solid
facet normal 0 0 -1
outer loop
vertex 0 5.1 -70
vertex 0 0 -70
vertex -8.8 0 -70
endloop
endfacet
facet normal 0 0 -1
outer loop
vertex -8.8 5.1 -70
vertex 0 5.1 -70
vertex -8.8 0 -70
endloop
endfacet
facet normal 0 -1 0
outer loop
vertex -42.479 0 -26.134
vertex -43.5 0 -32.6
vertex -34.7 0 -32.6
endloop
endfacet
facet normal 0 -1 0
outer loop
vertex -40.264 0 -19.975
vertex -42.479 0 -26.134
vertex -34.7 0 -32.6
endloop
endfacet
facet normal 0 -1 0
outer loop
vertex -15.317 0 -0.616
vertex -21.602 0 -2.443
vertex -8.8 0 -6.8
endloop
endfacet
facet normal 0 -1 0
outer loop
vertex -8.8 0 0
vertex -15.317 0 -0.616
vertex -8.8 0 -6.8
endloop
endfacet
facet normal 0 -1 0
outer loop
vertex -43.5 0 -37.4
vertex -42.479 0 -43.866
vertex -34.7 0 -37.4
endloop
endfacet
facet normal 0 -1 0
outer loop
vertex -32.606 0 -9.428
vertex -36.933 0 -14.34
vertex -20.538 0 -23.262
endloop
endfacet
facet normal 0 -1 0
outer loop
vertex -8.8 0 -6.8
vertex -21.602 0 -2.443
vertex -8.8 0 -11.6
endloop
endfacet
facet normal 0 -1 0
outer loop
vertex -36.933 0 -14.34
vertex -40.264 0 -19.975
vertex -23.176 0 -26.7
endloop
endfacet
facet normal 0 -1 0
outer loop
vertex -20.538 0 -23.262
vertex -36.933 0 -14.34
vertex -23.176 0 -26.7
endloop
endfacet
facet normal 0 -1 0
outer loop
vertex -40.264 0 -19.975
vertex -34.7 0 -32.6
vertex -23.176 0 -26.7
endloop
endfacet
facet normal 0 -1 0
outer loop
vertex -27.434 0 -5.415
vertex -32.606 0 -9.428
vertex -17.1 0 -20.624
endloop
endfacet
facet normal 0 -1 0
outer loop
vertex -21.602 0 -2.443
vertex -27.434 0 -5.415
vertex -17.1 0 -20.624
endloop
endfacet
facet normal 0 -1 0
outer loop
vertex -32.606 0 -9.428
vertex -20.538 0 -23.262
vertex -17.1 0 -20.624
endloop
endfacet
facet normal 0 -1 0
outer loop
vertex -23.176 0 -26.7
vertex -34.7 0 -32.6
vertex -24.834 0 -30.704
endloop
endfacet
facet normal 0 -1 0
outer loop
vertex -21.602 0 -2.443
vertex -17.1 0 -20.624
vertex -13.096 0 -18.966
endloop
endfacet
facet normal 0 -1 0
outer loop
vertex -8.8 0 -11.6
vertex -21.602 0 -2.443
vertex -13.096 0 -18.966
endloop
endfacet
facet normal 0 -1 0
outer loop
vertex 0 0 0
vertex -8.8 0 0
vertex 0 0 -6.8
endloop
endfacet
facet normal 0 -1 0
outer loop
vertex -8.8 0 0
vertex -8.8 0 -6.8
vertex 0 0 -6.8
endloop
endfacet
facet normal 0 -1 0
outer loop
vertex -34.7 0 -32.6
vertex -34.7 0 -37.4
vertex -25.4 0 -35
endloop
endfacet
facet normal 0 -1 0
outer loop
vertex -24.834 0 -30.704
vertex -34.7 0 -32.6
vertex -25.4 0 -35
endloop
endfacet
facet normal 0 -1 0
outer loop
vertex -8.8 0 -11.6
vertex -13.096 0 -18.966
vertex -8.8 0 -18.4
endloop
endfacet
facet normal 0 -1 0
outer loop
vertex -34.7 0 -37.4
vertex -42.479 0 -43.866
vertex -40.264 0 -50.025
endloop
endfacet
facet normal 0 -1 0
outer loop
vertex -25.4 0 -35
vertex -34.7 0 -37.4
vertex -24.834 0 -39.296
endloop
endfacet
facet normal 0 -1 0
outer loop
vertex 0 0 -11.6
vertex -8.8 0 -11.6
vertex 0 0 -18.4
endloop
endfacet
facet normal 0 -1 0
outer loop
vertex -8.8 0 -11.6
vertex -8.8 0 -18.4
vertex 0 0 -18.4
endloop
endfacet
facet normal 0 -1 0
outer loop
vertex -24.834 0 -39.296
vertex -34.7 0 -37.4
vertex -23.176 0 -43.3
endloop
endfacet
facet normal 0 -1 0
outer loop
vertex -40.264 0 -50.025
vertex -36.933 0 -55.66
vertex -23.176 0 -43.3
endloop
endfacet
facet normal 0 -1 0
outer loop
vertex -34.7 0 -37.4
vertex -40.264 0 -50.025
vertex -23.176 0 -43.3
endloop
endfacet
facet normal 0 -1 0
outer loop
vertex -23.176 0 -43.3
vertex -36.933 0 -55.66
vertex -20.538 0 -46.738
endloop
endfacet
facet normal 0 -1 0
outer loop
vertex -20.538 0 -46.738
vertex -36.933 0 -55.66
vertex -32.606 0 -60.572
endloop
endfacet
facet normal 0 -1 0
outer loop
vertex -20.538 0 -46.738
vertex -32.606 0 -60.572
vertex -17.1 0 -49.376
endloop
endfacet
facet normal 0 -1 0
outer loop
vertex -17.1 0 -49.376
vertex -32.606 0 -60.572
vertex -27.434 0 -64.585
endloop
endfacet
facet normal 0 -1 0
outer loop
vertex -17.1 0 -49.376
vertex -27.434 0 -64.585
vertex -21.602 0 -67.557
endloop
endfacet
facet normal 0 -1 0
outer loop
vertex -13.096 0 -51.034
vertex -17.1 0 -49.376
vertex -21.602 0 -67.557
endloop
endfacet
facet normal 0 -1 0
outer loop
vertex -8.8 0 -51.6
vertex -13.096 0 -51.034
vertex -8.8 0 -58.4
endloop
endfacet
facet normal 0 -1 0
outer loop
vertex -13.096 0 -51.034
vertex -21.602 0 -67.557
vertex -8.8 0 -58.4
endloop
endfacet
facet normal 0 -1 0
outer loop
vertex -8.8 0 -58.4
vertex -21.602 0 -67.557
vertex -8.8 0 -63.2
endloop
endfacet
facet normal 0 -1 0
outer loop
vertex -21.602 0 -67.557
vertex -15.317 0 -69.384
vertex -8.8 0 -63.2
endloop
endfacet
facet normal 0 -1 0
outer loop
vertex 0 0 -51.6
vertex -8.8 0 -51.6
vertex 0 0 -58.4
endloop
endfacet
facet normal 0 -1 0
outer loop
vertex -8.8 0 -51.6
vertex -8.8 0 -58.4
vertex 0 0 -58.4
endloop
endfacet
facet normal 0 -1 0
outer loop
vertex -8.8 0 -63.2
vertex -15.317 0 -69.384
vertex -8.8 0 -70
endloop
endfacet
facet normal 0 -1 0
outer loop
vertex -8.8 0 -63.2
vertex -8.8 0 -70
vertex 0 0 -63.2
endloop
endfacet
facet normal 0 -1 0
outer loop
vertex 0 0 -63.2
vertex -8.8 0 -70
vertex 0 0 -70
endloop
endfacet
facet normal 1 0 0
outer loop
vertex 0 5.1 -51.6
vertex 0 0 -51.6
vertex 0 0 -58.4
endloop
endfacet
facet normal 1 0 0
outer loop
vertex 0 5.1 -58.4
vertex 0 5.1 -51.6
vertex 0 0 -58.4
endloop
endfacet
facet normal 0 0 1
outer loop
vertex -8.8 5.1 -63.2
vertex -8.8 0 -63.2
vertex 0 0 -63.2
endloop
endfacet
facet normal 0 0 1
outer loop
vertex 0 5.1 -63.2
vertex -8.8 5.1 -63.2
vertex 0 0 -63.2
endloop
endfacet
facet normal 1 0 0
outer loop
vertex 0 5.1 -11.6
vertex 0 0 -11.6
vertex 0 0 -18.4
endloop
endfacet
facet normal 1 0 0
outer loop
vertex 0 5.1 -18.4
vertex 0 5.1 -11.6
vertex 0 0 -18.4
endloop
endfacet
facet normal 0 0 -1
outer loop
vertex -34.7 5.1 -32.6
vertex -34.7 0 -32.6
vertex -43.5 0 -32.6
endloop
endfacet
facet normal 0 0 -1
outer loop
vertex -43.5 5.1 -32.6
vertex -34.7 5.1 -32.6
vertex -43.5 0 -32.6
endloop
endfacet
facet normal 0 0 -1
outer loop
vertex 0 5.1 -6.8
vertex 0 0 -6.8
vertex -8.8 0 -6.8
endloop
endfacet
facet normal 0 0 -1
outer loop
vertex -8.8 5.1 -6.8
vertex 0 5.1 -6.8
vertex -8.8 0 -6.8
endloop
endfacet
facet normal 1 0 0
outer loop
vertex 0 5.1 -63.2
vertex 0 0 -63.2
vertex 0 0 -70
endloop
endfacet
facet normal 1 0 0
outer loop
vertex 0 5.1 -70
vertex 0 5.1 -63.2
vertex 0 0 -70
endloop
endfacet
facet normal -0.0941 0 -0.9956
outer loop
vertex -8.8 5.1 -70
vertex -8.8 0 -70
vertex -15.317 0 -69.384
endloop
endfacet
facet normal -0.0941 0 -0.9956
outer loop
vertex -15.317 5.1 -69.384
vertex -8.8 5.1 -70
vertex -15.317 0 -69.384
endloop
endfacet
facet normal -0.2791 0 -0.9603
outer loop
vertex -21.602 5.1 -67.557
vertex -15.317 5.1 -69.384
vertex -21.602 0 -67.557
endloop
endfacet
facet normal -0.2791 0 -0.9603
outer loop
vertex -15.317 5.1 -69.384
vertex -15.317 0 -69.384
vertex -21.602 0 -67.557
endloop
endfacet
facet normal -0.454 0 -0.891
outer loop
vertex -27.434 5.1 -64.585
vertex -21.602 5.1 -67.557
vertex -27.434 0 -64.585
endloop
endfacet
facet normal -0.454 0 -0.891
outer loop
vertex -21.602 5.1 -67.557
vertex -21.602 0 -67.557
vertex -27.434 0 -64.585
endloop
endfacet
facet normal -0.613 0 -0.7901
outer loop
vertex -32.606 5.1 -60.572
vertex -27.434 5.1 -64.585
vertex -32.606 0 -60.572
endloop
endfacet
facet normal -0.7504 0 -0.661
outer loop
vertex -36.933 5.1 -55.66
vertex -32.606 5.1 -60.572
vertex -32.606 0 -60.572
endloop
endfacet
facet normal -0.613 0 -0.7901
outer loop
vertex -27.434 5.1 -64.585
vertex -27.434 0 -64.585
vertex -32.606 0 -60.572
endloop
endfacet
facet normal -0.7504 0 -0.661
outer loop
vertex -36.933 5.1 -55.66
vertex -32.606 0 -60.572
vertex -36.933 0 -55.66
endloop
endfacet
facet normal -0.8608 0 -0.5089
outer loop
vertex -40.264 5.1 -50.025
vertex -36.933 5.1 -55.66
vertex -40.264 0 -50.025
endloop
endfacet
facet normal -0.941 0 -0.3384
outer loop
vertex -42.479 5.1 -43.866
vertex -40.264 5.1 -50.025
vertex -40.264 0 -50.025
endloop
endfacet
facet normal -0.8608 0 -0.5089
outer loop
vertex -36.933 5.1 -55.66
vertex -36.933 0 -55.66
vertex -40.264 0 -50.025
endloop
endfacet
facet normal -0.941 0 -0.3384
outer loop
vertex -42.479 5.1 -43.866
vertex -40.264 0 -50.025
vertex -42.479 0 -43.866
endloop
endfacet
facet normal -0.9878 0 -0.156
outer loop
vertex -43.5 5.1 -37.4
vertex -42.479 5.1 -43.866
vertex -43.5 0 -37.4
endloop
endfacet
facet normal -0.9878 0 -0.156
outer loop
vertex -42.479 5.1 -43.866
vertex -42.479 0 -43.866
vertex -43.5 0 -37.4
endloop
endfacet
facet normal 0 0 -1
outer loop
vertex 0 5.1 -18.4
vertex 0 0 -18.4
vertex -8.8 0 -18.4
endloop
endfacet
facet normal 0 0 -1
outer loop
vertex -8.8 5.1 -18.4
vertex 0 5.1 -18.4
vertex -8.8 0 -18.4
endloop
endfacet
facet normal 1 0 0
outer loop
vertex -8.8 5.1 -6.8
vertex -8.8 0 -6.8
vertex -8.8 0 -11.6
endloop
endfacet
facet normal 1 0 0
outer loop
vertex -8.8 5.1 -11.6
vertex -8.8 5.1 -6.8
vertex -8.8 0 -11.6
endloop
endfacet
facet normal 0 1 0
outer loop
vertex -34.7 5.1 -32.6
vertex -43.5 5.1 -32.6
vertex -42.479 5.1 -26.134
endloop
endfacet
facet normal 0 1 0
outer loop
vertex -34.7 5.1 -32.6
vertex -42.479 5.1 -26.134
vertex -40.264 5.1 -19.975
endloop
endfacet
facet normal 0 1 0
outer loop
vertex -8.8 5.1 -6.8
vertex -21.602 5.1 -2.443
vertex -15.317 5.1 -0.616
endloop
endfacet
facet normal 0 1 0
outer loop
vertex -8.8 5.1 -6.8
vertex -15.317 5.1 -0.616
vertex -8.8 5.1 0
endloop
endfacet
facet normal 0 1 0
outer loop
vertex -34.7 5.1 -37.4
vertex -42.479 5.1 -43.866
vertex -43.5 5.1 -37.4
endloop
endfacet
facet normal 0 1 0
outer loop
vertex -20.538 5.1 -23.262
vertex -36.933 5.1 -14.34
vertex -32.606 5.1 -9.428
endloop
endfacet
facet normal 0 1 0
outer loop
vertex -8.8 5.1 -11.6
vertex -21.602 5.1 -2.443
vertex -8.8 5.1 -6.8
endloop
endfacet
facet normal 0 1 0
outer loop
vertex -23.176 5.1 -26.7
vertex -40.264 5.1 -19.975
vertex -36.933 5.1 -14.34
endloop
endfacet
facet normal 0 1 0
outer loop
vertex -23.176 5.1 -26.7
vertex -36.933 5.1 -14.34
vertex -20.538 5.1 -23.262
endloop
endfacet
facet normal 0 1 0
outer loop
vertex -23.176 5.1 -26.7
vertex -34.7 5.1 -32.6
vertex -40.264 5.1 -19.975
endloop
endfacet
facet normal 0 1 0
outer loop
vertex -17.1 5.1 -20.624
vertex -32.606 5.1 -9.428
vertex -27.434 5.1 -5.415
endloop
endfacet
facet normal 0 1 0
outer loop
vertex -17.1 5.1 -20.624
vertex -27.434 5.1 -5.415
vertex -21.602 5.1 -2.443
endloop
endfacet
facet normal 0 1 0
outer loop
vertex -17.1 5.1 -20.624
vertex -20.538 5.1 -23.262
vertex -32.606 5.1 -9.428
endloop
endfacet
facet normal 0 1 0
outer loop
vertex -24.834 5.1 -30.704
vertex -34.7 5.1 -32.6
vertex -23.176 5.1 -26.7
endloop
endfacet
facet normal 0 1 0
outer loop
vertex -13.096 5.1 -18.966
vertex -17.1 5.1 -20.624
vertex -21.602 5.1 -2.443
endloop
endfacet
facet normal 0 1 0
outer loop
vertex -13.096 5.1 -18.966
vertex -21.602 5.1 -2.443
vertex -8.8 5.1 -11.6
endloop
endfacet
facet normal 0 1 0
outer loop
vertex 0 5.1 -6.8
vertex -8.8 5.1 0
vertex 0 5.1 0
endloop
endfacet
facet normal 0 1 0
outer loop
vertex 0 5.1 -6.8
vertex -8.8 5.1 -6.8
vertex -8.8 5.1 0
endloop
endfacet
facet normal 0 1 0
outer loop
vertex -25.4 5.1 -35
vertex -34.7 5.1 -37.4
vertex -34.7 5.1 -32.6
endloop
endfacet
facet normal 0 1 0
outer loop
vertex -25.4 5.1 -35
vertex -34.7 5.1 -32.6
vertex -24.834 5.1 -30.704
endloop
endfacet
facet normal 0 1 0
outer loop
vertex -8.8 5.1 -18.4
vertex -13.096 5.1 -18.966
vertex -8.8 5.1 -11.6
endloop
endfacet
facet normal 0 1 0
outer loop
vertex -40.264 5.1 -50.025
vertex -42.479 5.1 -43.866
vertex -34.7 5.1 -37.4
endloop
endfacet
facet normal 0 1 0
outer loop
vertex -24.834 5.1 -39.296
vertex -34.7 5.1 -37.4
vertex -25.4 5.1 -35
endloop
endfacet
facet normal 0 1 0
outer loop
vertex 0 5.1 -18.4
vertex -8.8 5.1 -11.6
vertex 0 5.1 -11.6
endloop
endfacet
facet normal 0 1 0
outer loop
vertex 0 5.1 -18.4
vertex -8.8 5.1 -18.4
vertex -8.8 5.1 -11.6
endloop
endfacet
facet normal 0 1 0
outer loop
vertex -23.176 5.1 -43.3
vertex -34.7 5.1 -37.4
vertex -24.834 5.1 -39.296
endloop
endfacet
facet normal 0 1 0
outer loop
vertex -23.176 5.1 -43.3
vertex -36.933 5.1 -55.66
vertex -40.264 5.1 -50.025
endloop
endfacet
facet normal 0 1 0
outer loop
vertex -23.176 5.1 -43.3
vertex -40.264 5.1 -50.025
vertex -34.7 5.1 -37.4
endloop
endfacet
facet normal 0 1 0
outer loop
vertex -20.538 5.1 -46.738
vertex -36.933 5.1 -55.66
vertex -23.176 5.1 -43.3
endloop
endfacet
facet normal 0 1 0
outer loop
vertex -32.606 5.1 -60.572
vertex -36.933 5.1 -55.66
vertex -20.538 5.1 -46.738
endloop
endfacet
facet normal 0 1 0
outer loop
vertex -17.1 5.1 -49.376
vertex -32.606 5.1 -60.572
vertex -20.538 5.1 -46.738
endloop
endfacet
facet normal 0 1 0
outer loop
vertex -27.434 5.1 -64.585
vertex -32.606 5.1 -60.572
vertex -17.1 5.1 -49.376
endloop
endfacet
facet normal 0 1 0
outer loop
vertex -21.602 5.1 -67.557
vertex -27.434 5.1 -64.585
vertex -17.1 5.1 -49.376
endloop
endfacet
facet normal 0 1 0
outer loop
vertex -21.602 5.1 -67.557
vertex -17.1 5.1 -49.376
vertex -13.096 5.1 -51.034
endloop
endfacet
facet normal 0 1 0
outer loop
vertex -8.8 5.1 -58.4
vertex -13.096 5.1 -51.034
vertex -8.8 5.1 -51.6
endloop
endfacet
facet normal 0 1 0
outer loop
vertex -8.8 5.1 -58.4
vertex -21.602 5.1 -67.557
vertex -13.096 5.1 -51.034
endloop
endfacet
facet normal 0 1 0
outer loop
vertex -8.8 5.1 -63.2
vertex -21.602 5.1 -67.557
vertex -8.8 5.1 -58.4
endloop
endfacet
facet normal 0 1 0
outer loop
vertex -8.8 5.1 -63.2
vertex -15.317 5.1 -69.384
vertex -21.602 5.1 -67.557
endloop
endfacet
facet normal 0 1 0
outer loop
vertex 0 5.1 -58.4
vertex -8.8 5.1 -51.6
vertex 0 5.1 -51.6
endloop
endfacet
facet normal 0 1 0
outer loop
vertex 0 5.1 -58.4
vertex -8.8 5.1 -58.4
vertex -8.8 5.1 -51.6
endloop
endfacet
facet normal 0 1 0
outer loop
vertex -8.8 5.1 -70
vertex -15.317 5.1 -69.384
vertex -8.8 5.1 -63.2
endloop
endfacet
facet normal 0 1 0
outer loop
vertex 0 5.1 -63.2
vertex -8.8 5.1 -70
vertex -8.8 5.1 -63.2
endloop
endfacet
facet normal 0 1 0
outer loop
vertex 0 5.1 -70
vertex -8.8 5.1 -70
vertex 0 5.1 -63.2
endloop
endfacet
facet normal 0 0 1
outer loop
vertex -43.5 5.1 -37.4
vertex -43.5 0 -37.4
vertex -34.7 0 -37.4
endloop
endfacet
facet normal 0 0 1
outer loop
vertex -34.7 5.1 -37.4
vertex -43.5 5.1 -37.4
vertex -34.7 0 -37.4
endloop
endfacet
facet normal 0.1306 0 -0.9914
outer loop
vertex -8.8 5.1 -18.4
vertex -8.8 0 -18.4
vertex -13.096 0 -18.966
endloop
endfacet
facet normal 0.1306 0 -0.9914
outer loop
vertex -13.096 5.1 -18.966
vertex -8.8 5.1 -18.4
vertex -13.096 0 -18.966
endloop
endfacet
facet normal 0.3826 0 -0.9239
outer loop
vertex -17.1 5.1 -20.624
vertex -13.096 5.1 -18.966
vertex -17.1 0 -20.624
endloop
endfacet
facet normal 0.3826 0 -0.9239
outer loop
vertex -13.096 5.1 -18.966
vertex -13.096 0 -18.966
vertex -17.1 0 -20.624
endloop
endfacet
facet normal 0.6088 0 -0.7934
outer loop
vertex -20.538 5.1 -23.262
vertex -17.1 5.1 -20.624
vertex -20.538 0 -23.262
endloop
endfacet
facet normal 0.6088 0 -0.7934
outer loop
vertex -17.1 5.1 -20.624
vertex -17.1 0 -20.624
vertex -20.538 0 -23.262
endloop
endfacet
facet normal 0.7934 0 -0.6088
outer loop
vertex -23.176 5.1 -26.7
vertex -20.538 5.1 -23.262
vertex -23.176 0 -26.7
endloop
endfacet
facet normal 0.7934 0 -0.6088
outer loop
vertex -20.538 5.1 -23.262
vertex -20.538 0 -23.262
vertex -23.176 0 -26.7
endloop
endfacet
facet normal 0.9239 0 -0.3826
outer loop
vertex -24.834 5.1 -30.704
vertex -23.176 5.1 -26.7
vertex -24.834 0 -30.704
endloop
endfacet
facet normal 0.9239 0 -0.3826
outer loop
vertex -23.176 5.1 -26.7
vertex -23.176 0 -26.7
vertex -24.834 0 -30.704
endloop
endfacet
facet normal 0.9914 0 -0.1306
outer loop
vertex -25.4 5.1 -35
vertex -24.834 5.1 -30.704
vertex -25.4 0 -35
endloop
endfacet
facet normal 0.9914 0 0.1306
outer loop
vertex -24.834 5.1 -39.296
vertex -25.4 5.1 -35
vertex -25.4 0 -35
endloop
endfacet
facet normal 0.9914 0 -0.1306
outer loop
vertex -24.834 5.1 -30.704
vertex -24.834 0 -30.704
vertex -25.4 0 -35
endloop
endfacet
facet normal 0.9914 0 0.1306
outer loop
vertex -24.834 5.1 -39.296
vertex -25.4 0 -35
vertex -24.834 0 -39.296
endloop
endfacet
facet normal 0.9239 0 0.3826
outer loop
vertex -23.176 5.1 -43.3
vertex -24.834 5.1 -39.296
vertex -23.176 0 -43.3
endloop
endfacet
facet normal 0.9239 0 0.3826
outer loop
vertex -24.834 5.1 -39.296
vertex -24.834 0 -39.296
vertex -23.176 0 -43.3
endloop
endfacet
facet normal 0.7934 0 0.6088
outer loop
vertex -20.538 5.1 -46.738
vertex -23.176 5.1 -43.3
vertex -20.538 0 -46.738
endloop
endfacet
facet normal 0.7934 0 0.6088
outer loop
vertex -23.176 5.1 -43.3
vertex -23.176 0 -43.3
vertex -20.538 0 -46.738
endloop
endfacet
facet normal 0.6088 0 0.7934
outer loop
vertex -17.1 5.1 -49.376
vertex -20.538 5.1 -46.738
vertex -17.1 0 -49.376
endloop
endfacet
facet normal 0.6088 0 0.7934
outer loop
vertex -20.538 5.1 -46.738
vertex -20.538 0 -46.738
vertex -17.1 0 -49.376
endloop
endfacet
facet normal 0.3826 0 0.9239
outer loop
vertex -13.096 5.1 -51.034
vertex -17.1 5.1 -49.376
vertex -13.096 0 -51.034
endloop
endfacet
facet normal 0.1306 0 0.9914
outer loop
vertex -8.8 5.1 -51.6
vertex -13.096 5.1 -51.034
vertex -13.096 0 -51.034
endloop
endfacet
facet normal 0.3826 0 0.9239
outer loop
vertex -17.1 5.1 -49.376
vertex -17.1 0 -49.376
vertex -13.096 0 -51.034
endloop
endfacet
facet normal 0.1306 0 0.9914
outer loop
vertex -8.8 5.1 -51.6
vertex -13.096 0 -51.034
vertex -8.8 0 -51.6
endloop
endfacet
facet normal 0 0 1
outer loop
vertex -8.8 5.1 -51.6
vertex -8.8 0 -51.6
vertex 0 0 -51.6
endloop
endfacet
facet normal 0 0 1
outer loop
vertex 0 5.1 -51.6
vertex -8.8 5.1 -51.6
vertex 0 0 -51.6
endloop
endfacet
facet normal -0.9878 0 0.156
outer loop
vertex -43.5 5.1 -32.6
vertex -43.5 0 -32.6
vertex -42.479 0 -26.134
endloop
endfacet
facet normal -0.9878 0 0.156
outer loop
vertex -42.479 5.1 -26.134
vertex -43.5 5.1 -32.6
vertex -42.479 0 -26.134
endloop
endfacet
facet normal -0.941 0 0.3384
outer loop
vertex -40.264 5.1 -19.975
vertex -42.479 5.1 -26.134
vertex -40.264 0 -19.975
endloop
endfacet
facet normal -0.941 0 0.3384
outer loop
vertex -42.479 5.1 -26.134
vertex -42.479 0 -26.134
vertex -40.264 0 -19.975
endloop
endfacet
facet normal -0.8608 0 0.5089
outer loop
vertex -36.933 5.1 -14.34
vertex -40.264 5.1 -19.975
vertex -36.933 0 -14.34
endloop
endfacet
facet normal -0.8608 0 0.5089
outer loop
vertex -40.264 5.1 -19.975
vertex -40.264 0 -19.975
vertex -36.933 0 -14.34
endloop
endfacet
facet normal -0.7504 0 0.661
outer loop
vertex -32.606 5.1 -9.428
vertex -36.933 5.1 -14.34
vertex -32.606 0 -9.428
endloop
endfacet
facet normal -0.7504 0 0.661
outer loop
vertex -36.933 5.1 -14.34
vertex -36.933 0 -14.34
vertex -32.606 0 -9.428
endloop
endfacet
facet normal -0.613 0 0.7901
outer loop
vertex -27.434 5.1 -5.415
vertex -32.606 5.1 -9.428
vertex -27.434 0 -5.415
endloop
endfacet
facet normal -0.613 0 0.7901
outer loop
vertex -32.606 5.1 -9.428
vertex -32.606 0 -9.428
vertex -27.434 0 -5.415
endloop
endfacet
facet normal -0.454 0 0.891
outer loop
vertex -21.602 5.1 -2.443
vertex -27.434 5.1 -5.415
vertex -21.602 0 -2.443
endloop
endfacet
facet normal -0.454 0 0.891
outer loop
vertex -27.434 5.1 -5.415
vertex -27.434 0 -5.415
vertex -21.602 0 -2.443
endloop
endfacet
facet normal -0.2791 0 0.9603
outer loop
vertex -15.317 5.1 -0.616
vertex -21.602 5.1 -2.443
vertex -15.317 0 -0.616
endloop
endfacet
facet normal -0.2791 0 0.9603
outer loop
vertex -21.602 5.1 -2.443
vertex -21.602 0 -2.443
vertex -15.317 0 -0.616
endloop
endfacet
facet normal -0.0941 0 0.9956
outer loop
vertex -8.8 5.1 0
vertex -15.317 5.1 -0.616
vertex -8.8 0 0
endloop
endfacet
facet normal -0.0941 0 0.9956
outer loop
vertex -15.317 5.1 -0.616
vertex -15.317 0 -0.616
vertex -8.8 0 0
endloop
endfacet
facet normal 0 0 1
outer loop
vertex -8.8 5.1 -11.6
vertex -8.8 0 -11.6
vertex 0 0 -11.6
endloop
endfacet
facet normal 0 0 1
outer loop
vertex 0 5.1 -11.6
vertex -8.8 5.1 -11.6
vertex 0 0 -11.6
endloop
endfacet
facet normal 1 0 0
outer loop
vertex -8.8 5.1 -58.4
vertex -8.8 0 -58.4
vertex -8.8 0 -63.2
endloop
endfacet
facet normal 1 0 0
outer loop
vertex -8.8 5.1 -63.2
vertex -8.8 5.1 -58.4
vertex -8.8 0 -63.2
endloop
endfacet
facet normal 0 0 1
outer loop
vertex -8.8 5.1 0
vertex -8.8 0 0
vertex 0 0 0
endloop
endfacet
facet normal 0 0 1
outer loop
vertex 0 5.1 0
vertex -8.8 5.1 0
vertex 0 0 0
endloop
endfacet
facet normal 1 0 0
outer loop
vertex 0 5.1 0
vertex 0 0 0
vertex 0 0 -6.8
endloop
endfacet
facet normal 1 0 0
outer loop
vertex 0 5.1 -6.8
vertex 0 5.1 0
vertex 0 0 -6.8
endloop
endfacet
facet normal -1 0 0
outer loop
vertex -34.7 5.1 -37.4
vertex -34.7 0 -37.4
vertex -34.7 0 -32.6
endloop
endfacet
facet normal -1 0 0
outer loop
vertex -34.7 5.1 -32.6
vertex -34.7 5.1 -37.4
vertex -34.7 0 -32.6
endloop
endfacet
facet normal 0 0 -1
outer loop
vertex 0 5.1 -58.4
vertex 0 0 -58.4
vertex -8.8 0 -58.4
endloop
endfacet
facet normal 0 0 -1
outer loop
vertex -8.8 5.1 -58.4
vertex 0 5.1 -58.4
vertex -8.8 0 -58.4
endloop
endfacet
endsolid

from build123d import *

# Parameters (mm, degrees)
SALIENTE_EXTRUIR1_DEPTH = 5.1


with BuildPart() as part:
    # Croquis1 → Saliente-Extruir1 (new body)
    with BuildSketch(Plane(origin=(0, 0, 0), x_dir=(1, 0, 0), z_dir=(0, 1, 0))):
        with BuildLine():
            Line((0, 0), (0, 6.8))
            Line((0, 6.8), (-8.8, 6.8))
            Line((-8.8, 6.8), (-8.8, 11.6))
            Line((-8.8, 11.6), (0, 11.6))
            Line((0, 11.6), (0, 18.4))
            Line((0, 18.4), (-8.8, 18.4))
            ThreePointArc((-8.8, 18.4), (-25.4, 35), (-8.8, 51.6))
            Line((-8.8, 51.6), (0, 51.6))
            Line((0, 51.6), (0, 58.4))
            Line((0, 58.4), (-8.8, 58.4))
            Line((-8.8, 58.4), (-8.8, 63.2))
            Line((-8.8, 63.2), (0, 63.2))
            Line((0, 63.2), (0, 70))
            Line((0, 70), (-8.8, 70))
            ThreePointArc((-8.8, 70), (-32.605724102, 60.57158363), (-43.5, 37.4))
            Line((-43.5, 37.4), (-34.7, 37.4))
            Line((-34.7, 37.4), (-34.7, 32.6))
            Line((-34.7, 32.6), (-43.5, 32.6))
            ThreePointArc((-43.5, 32.6), (-32.605724102, 9.42841637), (-8.8, 0))
            Line((-8.8, 0), (0, 0))
        make_face()
    extrude(amount=SALIENTE_EXTRUIR1_DEPTH)


solid = part.part
